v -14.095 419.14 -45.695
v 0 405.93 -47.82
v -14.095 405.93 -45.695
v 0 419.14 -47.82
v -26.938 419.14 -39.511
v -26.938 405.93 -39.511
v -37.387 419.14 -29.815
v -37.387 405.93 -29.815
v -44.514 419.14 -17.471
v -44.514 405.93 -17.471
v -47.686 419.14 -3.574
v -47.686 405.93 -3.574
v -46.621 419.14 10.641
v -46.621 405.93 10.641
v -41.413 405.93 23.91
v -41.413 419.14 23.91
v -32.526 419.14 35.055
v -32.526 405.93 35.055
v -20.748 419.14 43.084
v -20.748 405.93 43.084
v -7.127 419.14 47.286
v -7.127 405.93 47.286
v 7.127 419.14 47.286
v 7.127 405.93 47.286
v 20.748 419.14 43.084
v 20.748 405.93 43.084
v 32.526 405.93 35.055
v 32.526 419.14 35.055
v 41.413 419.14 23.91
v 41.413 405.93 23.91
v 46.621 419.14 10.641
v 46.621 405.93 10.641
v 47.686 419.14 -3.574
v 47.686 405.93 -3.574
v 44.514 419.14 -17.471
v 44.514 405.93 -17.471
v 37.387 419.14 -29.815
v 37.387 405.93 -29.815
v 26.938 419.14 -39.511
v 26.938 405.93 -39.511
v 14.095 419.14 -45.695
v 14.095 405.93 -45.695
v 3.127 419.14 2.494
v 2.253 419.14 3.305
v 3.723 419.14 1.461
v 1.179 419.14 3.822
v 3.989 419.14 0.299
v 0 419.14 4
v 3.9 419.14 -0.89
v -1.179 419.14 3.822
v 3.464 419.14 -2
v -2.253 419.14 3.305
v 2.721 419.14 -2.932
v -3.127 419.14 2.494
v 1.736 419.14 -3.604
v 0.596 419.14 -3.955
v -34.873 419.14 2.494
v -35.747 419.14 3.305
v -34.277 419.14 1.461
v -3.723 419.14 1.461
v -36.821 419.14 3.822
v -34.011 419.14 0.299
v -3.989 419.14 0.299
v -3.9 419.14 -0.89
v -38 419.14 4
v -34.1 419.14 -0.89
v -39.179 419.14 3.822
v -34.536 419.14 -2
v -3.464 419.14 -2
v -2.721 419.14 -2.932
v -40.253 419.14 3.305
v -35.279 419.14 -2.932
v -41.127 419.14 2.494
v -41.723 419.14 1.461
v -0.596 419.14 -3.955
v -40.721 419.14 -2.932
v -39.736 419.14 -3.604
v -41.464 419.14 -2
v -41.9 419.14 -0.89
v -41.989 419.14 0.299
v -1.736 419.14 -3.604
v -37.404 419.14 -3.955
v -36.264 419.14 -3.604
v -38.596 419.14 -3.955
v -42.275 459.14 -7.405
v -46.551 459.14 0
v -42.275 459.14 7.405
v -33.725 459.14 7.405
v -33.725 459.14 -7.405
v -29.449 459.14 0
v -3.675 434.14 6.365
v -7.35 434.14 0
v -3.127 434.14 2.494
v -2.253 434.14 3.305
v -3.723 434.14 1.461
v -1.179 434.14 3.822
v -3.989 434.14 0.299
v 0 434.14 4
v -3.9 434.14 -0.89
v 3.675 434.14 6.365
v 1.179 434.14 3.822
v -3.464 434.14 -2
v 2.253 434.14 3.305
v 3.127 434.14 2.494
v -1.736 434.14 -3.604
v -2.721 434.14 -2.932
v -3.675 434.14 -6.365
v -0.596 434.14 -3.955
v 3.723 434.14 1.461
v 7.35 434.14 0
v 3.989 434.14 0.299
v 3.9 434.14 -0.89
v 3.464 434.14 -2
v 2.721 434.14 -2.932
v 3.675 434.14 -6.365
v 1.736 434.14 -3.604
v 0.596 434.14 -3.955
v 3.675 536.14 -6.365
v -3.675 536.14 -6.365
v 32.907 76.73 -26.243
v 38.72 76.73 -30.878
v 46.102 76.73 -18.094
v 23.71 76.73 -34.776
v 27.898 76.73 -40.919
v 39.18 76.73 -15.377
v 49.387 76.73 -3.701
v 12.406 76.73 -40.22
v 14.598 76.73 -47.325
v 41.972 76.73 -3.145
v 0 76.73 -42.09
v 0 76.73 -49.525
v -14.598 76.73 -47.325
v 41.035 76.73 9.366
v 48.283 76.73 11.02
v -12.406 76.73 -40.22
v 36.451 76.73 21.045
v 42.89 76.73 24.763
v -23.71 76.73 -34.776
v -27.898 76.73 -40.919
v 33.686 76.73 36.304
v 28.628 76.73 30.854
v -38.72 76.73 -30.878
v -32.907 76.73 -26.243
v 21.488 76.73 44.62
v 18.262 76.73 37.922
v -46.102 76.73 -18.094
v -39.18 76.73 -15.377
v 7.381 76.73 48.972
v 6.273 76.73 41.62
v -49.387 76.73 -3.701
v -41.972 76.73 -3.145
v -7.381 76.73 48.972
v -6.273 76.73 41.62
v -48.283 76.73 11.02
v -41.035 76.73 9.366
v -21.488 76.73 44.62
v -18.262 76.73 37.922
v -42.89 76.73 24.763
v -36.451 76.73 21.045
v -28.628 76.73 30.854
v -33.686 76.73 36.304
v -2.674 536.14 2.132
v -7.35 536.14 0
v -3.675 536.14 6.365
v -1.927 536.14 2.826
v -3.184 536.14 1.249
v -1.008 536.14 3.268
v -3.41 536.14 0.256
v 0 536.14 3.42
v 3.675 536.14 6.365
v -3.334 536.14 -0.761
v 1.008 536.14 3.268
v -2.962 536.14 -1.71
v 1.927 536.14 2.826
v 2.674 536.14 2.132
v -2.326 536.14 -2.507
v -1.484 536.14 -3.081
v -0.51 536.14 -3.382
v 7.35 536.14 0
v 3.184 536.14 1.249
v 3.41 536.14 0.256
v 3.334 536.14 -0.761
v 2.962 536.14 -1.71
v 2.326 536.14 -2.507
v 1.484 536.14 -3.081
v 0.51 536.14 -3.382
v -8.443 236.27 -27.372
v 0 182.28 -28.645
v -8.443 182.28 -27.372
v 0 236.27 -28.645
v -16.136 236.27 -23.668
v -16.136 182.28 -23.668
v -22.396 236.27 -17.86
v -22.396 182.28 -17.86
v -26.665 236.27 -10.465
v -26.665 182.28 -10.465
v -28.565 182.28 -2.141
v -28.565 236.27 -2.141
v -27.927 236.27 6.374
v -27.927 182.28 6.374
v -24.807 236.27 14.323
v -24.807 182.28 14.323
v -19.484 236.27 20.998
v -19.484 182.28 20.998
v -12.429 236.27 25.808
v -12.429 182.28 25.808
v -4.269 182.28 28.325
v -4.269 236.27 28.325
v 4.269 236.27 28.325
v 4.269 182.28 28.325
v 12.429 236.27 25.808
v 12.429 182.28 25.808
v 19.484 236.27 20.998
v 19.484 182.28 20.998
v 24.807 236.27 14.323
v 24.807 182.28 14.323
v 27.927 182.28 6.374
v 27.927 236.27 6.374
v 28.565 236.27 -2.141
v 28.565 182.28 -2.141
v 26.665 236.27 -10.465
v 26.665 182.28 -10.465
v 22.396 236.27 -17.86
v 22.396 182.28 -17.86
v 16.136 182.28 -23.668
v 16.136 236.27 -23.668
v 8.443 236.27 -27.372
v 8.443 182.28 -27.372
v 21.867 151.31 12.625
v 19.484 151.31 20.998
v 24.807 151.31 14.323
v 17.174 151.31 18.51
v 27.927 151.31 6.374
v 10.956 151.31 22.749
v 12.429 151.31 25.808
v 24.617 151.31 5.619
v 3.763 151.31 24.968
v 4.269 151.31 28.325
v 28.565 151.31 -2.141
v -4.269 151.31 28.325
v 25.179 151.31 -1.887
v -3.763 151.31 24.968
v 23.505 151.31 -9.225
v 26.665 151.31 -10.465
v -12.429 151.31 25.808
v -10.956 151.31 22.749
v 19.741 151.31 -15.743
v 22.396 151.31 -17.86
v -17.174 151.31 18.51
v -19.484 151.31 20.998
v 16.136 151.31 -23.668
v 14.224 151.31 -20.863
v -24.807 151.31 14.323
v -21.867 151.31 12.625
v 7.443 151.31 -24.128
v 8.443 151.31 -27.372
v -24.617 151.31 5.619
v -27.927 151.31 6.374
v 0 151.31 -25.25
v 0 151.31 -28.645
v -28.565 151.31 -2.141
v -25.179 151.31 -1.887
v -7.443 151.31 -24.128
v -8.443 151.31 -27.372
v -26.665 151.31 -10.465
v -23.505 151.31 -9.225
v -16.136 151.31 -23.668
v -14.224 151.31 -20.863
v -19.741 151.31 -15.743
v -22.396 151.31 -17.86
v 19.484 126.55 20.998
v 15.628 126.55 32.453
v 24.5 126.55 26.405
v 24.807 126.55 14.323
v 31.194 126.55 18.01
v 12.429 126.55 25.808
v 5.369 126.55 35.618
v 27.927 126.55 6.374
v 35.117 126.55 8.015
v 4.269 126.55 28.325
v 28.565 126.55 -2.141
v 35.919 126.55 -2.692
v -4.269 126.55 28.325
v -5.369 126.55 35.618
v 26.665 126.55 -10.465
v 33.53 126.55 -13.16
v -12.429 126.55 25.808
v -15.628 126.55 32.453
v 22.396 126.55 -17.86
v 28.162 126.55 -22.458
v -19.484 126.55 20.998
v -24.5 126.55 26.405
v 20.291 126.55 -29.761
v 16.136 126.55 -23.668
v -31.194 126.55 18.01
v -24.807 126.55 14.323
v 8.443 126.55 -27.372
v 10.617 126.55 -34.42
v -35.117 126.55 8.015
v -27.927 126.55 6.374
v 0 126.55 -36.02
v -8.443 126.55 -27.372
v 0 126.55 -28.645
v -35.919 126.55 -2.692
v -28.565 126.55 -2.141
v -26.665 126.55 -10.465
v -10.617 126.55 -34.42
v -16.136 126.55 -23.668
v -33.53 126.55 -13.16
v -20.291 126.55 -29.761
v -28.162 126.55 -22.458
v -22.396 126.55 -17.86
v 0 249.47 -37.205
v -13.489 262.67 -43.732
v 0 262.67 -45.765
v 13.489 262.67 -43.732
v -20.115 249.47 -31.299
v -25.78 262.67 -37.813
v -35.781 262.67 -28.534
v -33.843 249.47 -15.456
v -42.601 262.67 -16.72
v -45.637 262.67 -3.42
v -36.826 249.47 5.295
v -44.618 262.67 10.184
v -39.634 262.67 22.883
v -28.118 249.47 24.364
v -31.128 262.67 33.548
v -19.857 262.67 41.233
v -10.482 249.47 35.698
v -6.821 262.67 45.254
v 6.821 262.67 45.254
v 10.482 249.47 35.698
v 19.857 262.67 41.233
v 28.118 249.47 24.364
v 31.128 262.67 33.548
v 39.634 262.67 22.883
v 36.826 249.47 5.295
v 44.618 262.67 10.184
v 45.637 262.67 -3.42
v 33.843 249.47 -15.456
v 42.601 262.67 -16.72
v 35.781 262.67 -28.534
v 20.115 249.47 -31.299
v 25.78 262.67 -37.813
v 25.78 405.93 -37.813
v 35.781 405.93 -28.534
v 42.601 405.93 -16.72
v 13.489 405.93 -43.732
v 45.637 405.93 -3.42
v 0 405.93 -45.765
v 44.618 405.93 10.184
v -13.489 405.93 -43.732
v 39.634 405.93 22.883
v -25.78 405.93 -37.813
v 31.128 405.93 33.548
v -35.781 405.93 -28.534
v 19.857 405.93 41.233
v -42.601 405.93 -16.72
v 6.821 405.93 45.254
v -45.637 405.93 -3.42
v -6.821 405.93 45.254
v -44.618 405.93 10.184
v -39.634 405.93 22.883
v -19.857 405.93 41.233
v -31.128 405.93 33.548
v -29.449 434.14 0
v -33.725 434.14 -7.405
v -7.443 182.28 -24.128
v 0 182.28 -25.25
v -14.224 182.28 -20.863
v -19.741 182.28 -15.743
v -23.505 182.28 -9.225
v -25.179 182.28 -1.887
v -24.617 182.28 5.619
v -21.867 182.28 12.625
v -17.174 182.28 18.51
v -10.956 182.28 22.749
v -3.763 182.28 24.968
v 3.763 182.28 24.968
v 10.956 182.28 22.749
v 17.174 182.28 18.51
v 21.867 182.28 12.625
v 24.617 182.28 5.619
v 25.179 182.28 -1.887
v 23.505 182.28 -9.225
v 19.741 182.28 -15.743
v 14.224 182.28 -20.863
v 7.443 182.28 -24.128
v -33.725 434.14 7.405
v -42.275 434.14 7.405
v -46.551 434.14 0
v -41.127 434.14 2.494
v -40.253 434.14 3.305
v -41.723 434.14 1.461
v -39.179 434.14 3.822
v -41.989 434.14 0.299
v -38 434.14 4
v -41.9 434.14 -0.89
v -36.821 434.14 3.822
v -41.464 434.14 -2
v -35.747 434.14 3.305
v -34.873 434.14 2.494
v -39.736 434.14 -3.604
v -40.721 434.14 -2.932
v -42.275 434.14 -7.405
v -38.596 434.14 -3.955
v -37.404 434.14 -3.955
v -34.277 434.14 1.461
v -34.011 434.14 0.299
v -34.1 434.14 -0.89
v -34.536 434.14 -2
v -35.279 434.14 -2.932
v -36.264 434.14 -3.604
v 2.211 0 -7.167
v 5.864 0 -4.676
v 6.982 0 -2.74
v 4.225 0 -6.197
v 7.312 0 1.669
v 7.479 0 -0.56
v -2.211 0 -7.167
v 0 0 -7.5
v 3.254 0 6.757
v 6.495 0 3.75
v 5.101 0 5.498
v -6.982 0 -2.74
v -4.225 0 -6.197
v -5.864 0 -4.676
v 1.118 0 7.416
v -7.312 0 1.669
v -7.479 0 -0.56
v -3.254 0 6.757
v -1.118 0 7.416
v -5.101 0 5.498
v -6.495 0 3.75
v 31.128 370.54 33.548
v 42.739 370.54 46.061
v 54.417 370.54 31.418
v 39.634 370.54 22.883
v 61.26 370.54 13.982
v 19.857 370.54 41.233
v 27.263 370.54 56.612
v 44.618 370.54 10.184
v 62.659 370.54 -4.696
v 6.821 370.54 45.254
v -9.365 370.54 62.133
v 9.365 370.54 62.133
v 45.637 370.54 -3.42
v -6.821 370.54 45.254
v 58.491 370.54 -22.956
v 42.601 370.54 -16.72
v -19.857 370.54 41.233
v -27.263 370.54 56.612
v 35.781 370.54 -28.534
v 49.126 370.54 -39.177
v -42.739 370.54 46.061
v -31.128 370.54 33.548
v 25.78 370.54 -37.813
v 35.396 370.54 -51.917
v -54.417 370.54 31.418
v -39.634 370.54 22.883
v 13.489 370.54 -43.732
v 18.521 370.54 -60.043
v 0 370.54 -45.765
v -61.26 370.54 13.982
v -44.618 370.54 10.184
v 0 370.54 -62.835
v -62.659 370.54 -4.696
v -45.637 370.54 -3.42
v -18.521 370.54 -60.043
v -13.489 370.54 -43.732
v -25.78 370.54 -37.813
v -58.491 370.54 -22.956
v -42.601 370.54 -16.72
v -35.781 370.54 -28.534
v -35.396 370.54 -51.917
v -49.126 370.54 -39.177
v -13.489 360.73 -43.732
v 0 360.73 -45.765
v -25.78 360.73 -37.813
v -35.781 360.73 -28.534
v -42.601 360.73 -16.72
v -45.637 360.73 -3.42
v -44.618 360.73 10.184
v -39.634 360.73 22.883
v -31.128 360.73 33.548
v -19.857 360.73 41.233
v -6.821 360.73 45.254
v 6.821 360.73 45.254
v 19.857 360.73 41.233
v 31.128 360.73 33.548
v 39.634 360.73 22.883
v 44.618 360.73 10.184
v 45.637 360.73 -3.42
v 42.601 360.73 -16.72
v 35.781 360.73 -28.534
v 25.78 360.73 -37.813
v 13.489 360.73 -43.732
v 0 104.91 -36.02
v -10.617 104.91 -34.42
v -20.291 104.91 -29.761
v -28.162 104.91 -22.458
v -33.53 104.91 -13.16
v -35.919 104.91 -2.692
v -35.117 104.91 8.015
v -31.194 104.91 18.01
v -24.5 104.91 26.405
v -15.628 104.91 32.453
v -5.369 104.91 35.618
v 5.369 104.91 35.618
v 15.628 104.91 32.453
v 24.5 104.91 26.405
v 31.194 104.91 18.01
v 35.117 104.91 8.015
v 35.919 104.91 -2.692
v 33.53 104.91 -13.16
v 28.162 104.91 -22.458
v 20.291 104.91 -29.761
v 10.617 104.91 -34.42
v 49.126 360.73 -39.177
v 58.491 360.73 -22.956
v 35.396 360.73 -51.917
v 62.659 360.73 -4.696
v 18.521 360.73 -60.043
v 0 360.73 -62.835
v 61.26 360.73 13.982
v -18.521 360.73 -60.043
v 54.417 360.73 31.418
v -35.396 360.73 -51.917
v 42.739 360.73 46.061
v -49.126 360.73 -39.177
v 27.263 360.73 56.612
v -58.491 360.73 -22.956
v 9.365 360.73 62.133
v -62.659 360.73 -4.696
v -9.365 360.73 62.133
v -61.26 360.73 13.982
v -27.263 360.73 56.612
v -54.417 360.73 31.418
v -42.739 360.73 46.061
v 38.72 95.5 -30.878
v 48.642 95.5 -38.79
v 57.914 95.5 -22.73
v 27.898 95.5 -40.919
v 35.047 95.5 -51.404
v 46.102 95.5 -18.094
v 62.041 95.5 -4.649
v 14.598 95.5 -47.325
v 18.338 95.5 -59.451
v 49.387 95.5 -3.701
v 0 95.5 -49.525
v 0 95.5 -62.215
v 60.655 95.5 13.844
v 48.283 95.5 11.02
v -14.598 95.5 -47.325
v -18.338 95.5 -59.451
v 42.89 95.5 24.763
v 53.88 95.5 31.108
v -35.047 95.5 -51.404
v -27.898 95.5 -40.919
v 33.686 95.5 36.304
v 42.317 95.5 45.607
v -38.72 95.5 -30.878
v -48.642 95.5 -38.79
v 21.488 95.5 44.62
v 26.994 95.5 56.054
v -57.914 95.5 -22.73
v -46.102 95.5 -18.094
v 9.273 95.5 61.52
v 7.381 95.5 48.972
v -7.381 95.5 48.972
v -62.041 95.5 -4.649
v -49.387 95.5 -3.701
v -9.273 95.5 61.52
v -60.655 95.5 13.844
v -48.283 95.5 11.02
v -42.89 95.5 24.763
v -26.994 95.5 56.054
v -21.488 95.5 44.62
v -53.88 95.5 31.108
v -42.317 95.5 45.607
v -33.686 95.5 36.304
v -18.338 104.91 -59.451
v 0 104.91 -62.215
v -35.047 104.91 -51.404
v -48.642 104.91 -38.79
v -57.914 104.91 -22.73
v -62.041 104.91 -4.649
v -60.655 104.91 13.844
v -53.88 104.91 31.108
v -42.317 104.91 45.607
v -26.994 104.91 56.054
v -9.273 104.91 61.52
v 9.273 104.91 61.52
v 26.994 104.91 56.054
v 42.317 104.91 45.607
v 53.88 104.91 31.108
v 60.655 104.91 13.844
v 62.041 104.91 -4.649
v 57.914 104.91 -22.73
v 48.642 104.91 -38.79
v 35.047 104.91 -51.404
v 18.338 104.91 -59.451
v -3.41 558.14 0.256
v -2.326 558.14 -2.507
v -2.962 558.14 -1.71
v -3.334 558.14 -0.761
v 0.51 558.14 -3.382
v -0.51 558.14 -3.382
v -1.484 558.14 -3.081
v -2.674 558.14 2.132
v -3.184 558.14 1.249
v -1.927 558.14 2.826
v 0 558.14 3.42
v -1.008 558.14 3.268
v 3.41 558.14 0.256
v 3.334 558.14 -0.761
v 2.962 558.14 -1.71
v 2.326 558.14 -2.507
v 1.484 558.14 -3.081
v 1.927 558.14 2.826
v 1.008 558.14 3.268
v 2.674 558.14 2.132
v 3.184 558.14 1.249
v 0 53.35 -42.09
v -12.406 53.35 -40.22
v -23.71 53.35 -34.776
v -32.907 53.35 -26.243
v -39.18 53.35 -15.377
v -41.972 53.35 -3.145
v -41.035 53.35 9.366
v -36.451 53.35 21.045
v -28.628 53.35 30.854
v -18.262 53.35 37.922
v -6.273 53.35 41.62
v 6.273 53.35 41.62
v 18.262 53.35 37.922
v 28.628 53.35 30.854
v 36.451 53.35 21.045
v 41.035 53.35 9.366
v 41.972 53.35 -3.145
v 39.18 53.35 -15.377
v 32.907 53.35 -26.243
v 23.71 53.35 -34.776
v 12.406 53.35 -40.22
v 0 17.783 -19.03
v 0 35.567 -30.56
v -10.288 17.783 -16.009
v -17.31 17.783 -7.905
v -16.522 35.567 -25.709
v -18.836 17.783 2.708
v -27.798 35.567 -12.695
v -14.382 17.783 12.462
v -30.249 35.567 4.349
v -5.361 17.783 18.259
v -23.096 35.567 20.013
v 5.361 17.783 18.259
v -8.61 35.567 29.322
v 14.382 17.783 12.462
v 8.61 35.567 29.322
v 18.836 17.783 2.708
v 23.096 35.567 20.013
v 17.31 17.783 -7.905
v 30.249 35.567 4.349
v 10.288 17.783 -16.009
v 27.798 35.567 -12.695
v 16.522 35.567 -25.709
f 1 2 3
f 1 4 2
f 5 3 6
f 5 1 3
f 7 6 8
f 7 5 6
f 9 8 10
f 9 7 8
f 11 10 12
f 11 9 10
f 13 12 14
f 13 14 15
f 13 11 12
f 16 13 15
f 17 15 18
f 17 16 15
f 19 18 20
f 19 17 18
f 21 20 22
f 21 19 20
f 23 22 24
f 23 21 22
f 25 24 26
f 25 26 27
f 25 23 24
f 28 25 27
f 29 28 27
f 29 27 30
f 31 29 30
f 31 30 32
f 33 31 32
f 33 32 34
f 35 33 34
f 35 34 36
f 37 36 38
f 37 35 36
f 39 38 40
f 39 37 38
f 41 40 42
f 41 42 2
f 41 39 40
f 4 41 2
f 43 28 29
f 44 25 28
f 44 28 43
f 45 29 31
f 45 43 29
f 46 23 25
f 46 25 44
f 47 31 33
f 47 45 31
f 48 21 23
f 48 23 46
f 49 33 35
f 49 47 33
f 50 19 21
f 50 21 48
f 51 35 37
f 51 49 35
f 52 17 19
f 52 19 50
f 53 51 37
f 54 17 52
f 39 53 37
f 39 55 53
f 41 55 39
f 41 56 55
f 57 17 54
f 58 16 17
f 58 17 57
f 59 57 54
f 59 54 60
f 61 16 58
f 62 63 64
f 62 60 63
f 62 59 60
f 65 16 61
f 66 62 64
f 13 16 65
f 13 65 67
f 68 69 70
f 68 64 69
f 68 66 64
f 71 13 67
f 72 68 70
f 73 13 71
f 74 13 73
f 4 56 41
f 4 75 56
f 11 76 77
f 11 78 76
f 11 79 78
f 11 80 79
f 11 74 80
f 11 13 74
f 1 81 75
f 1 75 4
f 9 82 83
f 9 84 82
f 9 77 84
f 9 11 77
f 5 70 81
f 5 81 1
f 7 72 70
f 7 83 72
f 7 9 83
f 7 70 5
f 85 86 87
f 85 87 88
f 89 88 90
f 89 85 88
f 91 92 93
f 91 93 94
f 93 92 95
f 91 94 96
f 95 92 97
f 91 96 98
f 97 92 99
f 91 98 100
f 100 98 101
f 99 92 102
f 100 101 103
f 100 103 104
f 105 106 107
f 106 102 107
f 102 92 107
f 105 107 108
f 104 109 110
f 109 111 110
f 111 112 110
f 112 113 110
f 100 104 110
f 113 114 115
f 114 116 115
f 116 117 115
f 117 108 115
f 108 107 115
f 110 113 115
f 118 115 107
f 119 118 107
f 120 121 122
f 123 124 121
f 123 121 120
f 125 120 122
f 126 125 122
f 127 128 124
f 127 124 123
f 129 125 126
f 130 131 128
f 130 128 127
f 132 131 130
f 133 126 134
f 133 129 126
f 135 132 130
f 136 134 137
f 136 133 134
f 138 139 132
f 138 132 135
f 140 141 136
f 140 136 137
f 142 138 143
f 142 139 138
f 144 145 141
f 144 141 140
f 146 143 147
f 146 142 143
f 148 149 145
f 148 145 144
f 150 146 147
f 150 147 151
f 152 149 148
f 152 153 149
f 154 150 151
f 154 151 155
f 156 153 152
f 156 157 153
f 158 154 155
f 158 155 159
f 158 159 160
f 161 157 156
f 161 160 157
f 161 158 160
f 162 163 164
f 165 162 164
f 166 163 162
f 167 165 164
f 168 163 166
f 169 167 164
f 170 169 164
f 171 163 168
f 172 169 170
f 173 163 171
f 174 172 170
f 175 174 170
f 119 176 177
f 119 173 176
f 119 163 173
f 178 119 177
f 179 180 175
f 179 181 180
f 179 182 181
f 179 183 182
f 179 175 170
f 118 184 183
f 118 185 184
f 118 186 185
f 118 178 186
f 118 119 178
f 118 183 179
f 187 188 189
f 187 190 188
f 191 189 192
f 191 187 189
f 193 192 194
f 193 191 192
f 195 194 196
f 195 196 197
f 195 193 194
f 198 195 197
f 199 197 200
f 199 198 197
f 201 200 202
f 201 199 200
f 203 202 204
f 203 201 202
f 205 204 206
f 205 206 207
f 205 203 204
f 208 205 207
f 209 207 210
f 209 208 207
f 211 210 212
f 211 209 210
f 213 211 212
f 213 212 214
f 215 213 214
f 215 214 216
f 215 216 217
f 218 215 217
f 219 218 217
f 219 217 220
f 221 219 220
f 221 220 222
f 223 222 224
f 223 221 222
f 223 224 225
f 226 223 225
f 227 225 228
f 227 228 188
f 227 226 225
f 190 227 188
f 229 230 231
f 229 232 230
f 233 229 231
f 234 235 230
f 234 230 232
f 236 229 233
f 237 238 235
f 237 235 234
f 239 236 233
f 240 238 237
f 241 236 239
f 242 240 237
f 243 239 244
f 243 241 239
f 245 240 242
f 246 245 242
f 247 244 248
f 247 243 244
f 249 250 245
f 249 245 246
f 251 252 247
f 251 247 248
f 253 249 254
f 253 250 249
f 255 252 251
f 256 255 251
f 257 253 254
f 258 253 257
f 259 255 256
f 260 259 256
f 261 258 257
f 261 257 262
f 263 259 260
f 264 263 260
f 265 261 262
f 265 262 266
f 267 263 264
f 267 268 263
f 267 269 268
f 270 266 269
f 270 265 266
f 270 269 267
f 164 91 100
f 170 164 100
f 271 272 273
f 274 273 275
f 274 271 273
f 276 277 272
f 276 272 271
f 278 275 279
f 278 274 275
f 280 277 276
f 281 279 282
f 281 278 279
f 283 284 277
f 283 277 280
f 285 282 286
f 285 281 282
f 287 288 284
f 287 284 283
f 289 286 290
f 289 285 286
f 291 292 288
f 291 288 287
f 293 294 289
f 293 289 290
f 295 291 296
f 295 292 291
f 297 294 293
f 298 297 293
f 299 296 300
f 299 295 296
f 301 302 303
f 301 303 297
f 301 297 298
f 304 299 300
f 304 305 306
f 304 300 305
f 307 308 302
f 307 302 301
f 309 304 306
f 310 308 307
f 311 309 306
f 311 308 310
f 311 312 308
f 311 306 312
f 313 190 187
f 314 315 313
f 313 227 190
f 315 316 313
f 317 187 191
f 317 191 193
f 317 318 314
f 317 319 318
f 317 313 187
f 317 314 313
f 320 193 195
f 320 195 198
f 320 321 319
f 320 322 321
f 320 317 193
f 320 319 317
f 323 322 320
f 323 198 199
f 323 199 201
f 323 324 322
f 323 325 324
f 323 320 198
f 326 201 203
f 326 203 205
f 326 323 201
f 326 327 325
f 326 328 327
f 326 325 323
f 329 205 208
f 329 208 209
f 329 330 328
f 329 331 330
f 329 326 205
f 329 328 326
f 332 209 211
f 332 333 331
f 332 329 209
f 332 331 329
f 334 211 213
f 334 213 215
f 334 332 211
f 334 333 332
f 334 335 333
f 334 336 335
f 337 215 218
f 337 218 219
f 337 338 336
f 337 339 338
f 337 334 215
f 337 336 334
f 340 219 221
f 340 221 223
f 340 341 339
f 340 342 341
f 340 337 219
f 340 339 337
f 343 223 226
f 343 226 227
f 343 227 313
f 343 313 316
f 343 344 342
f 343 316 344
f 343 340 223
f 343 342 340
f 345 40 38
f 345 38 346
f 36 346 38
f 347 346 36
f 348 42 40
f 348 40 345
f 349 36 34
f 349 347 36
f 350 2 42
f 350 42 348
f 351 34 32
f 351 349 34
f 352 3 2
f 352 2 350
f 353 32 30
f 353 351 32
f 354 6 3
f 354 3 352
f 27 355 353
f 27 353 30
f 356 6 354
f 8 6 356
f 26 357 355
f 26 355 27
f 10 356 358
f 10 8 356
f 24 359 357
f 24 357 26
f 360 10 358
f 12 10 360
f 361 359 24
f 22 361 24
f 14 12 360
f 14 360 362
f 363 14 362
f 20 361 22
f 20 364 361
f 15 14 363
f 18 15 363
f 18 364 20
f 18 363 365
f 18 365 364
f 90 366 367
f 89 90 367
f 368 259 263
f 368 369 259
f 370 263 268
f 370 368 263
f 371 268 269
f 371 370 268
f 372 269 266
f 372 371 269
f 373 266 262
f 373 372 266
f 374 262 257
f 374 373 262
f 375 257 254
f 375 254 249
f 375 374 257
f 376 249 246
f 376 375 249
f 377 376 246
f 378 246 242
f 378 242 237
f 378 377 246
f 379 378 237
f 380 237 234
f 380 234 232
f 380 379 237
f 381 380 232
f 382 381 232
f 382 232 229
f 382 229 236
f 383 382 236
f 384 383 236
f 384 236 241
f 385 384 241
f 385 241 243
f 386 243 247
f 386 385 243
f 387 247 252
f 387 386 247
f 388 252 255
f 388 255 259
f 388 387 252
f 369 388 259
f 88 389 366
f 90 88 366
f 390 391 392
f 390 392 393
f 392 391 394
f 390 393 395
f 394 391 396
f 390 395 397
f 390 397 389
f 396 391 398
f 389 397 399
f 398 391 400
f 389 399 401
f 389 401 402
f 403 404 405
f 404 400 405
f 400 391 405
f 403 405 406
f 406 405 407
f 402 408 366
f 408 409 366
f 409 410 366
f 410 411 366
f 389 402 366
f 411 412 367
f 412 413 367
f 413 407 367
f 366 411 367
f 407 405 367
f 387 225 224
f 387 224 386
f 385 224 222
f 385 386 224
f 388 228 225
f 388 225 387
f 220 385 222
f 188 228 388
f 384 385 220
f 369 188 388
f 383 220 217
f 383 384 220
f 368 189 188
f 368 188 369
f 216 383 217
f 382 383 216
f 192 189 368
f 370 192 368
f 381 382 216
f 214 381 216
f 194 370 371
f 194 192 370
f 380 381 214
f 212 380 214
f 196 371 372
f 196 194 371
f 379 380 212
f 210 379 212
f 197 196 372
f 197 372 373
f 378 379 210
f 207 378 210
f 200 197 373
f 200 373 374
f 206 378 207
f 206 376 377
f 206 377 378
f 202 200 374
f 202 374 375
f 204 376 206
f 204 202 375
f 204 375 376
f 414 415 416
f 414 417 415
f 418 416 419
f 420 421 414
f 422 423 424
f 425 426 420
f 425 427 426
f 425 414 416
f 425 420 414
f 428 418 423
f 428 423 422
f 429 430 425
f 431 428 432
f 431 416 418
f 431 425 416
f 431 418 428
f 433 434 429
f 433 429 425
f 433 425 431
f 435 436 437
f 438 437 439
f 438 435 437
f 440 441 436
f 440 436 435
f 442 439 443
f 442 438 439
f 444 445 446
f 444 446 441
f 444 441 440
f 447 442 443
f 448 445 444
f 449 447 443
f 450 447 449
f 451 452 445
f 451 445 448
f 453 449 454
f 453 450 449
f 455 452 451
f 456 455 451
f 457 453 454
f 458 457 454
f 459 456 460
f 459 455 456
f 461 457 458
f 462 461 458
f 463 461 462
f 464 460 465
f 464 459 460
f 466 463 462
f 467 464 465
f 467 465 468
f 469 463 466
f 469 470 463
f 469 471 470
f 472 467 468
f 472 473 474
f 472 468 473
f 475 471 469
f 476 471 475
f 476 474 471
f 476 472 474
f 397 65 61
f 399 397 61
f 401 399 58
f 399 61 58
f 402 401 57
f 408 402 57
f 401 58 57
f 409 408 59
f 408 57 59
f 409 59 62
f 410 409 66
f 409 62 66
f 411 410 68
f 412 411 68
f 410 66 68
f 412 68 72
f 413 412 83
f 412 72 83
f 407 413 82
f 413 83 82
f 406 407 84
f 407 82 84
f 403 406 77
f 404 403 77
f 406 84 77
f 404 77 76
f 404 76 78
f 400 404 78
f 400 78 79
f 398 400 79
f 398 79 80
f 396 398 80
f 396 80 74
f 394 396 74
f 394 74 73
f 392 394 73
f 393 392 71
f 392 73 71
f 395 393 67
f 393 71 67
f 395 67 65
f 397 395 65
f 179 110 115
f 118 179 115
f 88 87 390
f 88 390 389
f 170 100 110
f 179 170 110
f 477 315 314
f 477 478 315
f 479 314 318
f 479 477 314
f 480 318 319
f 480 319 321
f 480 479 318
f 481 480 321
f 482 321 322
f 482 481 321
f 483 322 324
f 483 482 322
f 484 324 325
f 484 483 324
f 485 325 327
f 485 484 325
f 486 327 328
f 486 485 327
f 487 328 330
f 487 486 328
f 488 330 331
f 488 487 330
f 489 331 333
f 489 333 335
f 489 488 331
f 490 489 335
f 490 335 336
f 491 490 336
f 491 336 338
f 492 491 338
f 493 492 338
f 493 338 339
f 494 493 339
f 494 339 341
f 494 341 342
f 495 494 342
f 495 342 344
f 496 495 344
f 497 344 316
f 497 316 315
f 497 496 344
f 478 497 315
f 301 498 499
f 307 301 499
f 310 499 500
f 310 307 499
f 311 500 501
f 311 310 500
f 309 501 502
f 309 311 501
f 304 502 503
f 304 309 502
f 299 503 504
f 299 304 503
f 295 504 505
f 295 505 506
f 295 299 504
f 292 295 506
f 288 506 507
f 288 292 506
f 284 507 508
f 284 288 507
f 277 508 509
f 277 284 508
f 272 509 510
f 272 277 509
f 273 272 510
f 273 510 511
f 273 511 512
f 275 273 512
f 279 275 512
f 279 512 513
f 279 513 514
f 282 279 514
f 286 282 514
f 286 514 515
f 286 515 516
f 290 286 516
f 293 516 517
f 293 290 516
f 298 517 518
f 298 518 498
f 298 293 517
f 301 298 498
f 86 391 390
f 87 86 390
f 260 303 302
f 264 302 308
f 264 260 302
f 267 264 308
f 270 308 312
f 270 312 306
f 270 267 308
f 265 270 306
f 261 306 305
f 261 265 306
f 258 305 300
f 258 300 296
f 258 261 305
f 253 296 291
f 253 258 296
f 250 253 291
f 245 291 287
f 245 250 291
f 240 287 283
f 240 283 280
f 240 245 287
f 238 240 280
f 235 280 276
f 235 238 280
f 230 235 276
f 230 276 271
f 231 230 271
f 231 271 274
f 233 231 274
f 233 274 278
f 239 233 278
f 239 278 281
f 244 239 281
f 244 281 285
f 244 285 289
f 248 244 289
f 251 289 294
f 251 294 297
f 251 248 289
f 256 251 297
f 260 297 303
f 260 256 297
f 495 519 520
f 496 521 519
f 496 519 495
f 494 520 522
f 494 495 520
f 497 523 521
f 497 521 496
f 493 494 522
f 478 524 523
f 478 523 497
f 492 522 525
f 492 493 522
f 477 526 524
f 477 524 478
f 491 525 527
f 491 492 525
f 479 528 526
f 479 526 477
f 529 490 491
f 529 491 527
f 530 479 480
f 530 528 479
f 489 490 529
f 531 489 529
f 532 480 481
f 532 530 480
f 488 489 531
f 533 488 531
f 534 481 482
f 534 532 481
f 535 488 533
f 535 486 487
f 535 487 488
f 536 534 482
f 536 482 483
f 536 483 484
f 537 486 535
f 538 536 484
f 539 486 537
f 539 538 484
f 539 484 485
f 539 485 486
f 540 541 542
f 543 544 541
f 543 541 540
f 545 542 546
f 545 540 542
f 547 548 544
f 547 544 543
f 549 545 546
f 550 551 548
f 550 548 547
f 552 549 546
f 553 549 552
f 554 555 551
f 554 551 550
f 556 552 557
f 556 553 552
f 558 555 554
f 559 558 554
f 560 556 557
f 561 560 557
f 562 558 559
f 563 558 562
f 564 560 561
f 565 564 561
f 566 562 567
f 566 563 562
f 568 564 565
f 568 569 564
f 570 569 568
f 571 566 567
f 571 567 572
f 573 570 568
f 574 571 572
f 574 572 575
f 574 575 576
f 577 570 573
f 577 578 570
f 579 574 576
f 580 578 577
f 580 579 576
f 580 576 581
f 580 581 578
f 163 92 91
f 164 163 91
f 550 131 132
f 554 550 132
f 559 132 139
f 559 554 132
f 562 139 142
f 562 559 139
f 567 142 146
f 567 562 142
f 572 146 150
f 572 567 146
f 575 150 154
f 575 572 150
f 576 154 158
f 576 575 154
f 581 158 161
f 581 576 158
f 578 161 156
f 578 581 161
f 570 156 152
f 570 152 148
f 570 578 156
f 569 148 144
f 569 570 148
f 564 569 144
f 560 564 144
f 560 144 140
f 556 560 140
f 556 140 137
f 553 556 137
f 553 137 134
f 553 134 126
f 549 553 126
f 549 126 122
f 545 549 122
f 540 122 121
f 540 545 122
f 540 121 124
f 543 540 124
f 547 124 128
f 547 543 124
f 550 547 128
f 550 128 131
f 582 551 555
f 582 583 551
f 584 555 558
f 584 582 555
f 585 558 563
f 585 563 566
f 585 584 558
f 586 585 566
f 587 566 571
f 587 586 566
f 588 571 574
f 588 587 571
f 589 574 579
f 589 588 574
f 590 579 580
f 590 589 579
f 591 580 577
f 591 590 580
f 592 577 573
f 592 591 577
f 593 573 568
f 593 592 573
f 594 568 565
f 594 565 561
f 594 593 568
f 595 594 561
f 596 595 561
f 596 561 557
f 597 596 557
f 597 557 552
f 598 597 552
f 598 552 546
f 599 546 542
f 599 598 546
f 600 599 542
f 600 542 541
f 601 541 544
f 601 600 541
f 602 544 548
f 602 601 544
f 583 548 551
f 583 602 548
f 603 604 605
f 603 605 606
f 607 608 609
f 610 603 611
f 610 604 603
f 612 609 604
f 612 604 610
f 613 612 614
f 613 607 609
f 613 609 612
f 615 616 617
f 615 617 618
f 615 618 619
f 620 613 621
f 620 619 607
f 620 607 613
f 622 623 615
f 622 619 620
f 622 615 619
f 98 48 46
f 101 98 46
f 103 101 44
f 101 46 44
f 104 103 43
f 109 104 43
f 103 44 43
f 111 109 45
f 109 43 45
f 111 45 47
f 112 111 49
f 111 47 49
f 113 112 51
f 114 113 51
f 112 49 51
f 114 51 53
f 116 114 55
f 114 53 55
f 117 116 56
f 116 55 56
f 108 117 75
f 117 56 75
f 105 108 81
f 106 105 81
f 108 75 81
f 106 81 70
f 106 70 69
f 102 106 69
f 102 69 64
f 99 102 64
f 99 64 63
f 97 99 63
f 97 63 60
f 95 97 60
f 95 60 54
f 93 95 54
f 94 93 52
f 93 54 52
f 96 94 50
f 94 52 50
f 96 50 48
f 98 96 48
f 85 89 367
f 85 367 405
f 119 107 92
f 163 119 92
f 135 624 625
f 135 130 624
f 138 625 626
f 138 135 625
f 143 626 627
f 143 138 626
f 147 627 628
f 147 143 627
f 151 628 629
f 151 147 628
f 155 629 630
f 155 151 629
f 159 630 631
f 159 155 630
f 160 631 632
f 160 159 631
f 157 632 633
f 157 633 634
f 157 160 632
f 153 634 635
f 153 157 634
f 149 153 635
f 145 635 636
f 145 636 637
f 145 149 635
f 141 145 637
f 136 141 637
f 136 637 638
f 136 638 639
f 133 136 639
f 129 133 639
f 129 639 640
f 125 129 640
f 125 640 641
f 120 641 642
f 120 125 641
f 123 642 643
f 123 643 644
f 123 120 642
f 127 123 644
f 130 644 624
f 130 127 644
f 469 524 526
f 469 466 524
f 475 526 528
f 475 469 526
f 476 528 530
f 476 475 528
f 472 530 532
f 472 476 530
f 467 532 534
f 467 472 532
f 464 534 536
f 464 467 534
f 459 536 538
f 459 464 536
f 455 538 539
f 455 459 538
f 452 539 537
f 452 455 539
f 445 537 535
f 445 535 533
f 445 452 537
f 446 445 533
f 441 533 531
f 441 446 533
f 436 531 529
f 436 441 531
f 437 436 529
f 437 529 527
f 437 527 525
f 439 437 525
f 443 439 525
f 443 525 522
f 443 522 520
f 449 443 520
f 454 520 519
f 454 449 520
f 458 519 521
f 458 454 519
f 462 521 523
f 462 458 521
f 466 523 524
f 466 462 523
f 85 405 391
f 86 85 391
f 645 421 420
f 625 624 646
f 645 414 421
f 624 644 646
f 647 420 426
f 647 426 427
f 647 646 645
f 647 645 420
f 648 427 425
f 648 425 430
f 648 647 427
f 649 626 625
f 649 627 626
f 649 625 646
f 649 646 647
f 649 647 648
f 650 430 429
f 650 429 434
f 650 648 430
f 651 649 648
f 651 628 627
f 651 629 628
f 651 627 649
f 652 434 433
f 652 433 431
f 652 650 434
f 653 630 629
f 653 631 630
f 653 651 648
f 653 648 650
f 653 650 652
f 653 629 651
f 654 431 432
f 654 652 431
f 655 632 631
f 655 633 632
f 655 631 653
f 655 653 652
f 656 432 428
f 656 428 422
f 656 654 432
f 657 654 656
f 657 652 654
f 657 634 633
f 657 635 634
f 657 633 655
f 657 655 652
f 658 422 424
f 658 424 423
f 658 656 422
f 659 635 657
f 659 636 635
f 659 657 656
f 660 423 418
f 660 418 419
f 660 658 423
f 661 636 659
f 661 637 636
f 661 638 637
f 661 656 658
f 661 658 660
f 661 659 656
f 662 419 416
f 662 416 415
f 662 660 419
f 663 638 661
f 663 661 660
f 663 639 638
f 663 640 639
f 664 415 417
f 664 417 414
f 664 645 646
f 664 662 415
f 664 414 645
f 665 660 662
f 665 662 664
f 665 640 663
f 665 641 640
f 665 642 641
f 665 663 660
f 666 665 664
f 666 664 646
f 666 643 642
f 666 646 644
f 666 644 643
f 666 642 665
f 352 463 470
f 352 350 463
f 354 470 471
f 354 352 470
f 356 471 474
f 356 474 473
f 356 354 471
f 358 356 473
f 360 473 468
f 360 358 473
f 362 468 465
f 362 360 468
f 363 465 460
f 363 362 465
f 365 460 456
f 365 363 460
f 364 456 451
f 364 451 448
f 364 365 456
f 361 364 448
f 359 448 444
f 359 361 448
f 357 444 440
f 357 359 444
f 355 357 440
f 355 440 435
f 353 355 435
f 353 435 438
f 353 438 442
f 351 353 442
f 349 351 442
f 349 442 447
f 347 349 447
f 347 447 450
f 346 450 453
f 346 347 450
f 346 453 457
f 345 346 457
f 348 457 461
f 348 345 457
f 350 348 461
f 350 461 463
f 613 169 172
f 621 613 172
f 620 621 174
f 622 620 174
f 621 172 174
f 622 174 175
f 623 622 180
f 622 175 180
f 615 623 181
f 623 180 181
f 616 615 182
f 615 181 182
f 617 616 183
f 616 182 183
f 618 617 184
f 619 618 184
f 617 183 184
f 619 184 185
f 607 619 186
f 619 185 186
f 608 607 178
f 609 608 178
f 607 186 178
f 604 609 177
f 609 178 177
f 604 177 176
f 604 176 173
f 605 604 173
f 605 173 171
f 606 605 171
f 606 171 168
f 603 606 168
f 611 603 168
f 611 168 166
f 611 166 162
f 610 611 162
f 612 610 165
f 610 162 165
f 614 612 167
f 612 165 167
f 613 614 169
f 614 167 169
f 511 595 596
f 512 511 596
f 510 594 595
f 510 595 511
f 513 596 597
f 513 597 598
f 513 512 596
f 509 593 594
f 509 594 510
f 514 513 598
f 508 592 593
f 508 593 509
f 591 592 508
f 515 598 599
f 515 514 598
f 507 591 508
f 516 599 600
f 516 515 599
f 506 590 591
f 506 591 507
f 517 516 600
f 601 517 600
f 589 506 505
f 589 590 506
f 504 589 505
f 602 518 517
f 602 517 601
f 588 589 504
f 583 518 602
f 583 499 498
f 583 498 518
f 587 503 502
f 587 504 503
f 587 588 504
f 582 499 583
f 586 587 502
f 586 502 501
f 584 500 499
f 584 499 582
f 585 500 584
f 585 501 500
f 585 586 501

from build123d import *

# Parameters (mm, degrees)
SKETCH_2_R      = 4
EXTRUDE_1_DEPTH = 15
EXTRUDE_2_DEPTH = 102
SKETCH_4_R      = 3.42
EXTRUDE_3_DEPTH = 22
EXTRUDE_4_DEPTH = 25


with BuildPart() as part:
    # 草图1 → 旋转1 (revolve)
    with BuildSketch(Plane.XY, mode=Mode.PRIVATE) as revolve_1_sk:
        Polygon((0, 0), (7.5, 0), (42.09, 53.35), (42.09, 76.73), (49.525, 76.73), (49.525, 95.5), (62.215, 95.5), (62.215, 104.91), (36.02, 104.91), (36.02, 126.55), (28.645, 126.55), (28.645, 151.31), (25.25, 151.31), (25.25, 182.28), (28.645, 182.28), (28.645, 236.27), (45.765, 262.67), (45.765, 360.73), (62.835, 360.73), (62.835, 370.54), (45.765, 370.54), (45.765, 405.93), (47.82, 405.93), (47.82, 419.14), (0, 419.14), align=None)
    revolve(revolve_1_sk.sketch.rotate(Axis((0, 0, 0), (0, 1, 0)), 90), axis=Axis((0, 0, 0), (0, 1, 0)))

    # 草图2 → 凸台-拉伸1 (add)
    with BuildSketch(Plane(origin=(0, 419.14, 0), x_dir=(1, 0, 0), z_dir=(0, 1, 0))):
        with Locations(Location((0, 0, 0), (0, 0, 270))):
            Circle(SKETCH_2_R)
        with Locations(Location((-38, 0, 0), (0, 0, 270))):
            Circle(SKETCH_2_R)
    extrude(amount=EXTRUDE_1_DEPTH)

    # 草图3 → 凸台-拉伸2 (add)
    with BuildSketch(Plane(origin=(0, 434.14, 0), x_dir=(1, 0, 0), z_dir=(0, 1, 0))):
        Polygon((3.674834463, -6.365), (7.349668927, 0), (3.674834463, 6.365), (-3.674834463, 6.365), (-7.349668927, 0), (-3.674834463, -6.365), align=None)
    extrude(amount=EXTRUDE_2_DEPTH)

    # 草图4 → 凸台-拉伸3 (add)
    with BuildSketch(Plane(origin=(0, 536.14, 0), x_dir=(1, 0, 0), z_dir=(0, 1, 0))):
        with Locations(Location((0, 0, 0), (0, 0, 270))):
            Circle(SKETCH_4_R)
    extrude(amount=EXTRUDE_3_DEPTH)

    # 草图5 → 凸台-拉伸4 (add)
    with BuildSketch(Plane(origin=(0, 434.14, 0), x_dir=(1, 0, 0), z_dir=(0, 1, 0))):
        Polygon((-29.449442513, 0), (-33.724721257, 7.405), (-42.275278743, 7.405), (-46.550557487, 0), (-42.275278743, -7.405), (-33.724721257, -7.405), align=None)
    extrude(amount=EXTRUDE_4_DEPTH)


solid = part.part
